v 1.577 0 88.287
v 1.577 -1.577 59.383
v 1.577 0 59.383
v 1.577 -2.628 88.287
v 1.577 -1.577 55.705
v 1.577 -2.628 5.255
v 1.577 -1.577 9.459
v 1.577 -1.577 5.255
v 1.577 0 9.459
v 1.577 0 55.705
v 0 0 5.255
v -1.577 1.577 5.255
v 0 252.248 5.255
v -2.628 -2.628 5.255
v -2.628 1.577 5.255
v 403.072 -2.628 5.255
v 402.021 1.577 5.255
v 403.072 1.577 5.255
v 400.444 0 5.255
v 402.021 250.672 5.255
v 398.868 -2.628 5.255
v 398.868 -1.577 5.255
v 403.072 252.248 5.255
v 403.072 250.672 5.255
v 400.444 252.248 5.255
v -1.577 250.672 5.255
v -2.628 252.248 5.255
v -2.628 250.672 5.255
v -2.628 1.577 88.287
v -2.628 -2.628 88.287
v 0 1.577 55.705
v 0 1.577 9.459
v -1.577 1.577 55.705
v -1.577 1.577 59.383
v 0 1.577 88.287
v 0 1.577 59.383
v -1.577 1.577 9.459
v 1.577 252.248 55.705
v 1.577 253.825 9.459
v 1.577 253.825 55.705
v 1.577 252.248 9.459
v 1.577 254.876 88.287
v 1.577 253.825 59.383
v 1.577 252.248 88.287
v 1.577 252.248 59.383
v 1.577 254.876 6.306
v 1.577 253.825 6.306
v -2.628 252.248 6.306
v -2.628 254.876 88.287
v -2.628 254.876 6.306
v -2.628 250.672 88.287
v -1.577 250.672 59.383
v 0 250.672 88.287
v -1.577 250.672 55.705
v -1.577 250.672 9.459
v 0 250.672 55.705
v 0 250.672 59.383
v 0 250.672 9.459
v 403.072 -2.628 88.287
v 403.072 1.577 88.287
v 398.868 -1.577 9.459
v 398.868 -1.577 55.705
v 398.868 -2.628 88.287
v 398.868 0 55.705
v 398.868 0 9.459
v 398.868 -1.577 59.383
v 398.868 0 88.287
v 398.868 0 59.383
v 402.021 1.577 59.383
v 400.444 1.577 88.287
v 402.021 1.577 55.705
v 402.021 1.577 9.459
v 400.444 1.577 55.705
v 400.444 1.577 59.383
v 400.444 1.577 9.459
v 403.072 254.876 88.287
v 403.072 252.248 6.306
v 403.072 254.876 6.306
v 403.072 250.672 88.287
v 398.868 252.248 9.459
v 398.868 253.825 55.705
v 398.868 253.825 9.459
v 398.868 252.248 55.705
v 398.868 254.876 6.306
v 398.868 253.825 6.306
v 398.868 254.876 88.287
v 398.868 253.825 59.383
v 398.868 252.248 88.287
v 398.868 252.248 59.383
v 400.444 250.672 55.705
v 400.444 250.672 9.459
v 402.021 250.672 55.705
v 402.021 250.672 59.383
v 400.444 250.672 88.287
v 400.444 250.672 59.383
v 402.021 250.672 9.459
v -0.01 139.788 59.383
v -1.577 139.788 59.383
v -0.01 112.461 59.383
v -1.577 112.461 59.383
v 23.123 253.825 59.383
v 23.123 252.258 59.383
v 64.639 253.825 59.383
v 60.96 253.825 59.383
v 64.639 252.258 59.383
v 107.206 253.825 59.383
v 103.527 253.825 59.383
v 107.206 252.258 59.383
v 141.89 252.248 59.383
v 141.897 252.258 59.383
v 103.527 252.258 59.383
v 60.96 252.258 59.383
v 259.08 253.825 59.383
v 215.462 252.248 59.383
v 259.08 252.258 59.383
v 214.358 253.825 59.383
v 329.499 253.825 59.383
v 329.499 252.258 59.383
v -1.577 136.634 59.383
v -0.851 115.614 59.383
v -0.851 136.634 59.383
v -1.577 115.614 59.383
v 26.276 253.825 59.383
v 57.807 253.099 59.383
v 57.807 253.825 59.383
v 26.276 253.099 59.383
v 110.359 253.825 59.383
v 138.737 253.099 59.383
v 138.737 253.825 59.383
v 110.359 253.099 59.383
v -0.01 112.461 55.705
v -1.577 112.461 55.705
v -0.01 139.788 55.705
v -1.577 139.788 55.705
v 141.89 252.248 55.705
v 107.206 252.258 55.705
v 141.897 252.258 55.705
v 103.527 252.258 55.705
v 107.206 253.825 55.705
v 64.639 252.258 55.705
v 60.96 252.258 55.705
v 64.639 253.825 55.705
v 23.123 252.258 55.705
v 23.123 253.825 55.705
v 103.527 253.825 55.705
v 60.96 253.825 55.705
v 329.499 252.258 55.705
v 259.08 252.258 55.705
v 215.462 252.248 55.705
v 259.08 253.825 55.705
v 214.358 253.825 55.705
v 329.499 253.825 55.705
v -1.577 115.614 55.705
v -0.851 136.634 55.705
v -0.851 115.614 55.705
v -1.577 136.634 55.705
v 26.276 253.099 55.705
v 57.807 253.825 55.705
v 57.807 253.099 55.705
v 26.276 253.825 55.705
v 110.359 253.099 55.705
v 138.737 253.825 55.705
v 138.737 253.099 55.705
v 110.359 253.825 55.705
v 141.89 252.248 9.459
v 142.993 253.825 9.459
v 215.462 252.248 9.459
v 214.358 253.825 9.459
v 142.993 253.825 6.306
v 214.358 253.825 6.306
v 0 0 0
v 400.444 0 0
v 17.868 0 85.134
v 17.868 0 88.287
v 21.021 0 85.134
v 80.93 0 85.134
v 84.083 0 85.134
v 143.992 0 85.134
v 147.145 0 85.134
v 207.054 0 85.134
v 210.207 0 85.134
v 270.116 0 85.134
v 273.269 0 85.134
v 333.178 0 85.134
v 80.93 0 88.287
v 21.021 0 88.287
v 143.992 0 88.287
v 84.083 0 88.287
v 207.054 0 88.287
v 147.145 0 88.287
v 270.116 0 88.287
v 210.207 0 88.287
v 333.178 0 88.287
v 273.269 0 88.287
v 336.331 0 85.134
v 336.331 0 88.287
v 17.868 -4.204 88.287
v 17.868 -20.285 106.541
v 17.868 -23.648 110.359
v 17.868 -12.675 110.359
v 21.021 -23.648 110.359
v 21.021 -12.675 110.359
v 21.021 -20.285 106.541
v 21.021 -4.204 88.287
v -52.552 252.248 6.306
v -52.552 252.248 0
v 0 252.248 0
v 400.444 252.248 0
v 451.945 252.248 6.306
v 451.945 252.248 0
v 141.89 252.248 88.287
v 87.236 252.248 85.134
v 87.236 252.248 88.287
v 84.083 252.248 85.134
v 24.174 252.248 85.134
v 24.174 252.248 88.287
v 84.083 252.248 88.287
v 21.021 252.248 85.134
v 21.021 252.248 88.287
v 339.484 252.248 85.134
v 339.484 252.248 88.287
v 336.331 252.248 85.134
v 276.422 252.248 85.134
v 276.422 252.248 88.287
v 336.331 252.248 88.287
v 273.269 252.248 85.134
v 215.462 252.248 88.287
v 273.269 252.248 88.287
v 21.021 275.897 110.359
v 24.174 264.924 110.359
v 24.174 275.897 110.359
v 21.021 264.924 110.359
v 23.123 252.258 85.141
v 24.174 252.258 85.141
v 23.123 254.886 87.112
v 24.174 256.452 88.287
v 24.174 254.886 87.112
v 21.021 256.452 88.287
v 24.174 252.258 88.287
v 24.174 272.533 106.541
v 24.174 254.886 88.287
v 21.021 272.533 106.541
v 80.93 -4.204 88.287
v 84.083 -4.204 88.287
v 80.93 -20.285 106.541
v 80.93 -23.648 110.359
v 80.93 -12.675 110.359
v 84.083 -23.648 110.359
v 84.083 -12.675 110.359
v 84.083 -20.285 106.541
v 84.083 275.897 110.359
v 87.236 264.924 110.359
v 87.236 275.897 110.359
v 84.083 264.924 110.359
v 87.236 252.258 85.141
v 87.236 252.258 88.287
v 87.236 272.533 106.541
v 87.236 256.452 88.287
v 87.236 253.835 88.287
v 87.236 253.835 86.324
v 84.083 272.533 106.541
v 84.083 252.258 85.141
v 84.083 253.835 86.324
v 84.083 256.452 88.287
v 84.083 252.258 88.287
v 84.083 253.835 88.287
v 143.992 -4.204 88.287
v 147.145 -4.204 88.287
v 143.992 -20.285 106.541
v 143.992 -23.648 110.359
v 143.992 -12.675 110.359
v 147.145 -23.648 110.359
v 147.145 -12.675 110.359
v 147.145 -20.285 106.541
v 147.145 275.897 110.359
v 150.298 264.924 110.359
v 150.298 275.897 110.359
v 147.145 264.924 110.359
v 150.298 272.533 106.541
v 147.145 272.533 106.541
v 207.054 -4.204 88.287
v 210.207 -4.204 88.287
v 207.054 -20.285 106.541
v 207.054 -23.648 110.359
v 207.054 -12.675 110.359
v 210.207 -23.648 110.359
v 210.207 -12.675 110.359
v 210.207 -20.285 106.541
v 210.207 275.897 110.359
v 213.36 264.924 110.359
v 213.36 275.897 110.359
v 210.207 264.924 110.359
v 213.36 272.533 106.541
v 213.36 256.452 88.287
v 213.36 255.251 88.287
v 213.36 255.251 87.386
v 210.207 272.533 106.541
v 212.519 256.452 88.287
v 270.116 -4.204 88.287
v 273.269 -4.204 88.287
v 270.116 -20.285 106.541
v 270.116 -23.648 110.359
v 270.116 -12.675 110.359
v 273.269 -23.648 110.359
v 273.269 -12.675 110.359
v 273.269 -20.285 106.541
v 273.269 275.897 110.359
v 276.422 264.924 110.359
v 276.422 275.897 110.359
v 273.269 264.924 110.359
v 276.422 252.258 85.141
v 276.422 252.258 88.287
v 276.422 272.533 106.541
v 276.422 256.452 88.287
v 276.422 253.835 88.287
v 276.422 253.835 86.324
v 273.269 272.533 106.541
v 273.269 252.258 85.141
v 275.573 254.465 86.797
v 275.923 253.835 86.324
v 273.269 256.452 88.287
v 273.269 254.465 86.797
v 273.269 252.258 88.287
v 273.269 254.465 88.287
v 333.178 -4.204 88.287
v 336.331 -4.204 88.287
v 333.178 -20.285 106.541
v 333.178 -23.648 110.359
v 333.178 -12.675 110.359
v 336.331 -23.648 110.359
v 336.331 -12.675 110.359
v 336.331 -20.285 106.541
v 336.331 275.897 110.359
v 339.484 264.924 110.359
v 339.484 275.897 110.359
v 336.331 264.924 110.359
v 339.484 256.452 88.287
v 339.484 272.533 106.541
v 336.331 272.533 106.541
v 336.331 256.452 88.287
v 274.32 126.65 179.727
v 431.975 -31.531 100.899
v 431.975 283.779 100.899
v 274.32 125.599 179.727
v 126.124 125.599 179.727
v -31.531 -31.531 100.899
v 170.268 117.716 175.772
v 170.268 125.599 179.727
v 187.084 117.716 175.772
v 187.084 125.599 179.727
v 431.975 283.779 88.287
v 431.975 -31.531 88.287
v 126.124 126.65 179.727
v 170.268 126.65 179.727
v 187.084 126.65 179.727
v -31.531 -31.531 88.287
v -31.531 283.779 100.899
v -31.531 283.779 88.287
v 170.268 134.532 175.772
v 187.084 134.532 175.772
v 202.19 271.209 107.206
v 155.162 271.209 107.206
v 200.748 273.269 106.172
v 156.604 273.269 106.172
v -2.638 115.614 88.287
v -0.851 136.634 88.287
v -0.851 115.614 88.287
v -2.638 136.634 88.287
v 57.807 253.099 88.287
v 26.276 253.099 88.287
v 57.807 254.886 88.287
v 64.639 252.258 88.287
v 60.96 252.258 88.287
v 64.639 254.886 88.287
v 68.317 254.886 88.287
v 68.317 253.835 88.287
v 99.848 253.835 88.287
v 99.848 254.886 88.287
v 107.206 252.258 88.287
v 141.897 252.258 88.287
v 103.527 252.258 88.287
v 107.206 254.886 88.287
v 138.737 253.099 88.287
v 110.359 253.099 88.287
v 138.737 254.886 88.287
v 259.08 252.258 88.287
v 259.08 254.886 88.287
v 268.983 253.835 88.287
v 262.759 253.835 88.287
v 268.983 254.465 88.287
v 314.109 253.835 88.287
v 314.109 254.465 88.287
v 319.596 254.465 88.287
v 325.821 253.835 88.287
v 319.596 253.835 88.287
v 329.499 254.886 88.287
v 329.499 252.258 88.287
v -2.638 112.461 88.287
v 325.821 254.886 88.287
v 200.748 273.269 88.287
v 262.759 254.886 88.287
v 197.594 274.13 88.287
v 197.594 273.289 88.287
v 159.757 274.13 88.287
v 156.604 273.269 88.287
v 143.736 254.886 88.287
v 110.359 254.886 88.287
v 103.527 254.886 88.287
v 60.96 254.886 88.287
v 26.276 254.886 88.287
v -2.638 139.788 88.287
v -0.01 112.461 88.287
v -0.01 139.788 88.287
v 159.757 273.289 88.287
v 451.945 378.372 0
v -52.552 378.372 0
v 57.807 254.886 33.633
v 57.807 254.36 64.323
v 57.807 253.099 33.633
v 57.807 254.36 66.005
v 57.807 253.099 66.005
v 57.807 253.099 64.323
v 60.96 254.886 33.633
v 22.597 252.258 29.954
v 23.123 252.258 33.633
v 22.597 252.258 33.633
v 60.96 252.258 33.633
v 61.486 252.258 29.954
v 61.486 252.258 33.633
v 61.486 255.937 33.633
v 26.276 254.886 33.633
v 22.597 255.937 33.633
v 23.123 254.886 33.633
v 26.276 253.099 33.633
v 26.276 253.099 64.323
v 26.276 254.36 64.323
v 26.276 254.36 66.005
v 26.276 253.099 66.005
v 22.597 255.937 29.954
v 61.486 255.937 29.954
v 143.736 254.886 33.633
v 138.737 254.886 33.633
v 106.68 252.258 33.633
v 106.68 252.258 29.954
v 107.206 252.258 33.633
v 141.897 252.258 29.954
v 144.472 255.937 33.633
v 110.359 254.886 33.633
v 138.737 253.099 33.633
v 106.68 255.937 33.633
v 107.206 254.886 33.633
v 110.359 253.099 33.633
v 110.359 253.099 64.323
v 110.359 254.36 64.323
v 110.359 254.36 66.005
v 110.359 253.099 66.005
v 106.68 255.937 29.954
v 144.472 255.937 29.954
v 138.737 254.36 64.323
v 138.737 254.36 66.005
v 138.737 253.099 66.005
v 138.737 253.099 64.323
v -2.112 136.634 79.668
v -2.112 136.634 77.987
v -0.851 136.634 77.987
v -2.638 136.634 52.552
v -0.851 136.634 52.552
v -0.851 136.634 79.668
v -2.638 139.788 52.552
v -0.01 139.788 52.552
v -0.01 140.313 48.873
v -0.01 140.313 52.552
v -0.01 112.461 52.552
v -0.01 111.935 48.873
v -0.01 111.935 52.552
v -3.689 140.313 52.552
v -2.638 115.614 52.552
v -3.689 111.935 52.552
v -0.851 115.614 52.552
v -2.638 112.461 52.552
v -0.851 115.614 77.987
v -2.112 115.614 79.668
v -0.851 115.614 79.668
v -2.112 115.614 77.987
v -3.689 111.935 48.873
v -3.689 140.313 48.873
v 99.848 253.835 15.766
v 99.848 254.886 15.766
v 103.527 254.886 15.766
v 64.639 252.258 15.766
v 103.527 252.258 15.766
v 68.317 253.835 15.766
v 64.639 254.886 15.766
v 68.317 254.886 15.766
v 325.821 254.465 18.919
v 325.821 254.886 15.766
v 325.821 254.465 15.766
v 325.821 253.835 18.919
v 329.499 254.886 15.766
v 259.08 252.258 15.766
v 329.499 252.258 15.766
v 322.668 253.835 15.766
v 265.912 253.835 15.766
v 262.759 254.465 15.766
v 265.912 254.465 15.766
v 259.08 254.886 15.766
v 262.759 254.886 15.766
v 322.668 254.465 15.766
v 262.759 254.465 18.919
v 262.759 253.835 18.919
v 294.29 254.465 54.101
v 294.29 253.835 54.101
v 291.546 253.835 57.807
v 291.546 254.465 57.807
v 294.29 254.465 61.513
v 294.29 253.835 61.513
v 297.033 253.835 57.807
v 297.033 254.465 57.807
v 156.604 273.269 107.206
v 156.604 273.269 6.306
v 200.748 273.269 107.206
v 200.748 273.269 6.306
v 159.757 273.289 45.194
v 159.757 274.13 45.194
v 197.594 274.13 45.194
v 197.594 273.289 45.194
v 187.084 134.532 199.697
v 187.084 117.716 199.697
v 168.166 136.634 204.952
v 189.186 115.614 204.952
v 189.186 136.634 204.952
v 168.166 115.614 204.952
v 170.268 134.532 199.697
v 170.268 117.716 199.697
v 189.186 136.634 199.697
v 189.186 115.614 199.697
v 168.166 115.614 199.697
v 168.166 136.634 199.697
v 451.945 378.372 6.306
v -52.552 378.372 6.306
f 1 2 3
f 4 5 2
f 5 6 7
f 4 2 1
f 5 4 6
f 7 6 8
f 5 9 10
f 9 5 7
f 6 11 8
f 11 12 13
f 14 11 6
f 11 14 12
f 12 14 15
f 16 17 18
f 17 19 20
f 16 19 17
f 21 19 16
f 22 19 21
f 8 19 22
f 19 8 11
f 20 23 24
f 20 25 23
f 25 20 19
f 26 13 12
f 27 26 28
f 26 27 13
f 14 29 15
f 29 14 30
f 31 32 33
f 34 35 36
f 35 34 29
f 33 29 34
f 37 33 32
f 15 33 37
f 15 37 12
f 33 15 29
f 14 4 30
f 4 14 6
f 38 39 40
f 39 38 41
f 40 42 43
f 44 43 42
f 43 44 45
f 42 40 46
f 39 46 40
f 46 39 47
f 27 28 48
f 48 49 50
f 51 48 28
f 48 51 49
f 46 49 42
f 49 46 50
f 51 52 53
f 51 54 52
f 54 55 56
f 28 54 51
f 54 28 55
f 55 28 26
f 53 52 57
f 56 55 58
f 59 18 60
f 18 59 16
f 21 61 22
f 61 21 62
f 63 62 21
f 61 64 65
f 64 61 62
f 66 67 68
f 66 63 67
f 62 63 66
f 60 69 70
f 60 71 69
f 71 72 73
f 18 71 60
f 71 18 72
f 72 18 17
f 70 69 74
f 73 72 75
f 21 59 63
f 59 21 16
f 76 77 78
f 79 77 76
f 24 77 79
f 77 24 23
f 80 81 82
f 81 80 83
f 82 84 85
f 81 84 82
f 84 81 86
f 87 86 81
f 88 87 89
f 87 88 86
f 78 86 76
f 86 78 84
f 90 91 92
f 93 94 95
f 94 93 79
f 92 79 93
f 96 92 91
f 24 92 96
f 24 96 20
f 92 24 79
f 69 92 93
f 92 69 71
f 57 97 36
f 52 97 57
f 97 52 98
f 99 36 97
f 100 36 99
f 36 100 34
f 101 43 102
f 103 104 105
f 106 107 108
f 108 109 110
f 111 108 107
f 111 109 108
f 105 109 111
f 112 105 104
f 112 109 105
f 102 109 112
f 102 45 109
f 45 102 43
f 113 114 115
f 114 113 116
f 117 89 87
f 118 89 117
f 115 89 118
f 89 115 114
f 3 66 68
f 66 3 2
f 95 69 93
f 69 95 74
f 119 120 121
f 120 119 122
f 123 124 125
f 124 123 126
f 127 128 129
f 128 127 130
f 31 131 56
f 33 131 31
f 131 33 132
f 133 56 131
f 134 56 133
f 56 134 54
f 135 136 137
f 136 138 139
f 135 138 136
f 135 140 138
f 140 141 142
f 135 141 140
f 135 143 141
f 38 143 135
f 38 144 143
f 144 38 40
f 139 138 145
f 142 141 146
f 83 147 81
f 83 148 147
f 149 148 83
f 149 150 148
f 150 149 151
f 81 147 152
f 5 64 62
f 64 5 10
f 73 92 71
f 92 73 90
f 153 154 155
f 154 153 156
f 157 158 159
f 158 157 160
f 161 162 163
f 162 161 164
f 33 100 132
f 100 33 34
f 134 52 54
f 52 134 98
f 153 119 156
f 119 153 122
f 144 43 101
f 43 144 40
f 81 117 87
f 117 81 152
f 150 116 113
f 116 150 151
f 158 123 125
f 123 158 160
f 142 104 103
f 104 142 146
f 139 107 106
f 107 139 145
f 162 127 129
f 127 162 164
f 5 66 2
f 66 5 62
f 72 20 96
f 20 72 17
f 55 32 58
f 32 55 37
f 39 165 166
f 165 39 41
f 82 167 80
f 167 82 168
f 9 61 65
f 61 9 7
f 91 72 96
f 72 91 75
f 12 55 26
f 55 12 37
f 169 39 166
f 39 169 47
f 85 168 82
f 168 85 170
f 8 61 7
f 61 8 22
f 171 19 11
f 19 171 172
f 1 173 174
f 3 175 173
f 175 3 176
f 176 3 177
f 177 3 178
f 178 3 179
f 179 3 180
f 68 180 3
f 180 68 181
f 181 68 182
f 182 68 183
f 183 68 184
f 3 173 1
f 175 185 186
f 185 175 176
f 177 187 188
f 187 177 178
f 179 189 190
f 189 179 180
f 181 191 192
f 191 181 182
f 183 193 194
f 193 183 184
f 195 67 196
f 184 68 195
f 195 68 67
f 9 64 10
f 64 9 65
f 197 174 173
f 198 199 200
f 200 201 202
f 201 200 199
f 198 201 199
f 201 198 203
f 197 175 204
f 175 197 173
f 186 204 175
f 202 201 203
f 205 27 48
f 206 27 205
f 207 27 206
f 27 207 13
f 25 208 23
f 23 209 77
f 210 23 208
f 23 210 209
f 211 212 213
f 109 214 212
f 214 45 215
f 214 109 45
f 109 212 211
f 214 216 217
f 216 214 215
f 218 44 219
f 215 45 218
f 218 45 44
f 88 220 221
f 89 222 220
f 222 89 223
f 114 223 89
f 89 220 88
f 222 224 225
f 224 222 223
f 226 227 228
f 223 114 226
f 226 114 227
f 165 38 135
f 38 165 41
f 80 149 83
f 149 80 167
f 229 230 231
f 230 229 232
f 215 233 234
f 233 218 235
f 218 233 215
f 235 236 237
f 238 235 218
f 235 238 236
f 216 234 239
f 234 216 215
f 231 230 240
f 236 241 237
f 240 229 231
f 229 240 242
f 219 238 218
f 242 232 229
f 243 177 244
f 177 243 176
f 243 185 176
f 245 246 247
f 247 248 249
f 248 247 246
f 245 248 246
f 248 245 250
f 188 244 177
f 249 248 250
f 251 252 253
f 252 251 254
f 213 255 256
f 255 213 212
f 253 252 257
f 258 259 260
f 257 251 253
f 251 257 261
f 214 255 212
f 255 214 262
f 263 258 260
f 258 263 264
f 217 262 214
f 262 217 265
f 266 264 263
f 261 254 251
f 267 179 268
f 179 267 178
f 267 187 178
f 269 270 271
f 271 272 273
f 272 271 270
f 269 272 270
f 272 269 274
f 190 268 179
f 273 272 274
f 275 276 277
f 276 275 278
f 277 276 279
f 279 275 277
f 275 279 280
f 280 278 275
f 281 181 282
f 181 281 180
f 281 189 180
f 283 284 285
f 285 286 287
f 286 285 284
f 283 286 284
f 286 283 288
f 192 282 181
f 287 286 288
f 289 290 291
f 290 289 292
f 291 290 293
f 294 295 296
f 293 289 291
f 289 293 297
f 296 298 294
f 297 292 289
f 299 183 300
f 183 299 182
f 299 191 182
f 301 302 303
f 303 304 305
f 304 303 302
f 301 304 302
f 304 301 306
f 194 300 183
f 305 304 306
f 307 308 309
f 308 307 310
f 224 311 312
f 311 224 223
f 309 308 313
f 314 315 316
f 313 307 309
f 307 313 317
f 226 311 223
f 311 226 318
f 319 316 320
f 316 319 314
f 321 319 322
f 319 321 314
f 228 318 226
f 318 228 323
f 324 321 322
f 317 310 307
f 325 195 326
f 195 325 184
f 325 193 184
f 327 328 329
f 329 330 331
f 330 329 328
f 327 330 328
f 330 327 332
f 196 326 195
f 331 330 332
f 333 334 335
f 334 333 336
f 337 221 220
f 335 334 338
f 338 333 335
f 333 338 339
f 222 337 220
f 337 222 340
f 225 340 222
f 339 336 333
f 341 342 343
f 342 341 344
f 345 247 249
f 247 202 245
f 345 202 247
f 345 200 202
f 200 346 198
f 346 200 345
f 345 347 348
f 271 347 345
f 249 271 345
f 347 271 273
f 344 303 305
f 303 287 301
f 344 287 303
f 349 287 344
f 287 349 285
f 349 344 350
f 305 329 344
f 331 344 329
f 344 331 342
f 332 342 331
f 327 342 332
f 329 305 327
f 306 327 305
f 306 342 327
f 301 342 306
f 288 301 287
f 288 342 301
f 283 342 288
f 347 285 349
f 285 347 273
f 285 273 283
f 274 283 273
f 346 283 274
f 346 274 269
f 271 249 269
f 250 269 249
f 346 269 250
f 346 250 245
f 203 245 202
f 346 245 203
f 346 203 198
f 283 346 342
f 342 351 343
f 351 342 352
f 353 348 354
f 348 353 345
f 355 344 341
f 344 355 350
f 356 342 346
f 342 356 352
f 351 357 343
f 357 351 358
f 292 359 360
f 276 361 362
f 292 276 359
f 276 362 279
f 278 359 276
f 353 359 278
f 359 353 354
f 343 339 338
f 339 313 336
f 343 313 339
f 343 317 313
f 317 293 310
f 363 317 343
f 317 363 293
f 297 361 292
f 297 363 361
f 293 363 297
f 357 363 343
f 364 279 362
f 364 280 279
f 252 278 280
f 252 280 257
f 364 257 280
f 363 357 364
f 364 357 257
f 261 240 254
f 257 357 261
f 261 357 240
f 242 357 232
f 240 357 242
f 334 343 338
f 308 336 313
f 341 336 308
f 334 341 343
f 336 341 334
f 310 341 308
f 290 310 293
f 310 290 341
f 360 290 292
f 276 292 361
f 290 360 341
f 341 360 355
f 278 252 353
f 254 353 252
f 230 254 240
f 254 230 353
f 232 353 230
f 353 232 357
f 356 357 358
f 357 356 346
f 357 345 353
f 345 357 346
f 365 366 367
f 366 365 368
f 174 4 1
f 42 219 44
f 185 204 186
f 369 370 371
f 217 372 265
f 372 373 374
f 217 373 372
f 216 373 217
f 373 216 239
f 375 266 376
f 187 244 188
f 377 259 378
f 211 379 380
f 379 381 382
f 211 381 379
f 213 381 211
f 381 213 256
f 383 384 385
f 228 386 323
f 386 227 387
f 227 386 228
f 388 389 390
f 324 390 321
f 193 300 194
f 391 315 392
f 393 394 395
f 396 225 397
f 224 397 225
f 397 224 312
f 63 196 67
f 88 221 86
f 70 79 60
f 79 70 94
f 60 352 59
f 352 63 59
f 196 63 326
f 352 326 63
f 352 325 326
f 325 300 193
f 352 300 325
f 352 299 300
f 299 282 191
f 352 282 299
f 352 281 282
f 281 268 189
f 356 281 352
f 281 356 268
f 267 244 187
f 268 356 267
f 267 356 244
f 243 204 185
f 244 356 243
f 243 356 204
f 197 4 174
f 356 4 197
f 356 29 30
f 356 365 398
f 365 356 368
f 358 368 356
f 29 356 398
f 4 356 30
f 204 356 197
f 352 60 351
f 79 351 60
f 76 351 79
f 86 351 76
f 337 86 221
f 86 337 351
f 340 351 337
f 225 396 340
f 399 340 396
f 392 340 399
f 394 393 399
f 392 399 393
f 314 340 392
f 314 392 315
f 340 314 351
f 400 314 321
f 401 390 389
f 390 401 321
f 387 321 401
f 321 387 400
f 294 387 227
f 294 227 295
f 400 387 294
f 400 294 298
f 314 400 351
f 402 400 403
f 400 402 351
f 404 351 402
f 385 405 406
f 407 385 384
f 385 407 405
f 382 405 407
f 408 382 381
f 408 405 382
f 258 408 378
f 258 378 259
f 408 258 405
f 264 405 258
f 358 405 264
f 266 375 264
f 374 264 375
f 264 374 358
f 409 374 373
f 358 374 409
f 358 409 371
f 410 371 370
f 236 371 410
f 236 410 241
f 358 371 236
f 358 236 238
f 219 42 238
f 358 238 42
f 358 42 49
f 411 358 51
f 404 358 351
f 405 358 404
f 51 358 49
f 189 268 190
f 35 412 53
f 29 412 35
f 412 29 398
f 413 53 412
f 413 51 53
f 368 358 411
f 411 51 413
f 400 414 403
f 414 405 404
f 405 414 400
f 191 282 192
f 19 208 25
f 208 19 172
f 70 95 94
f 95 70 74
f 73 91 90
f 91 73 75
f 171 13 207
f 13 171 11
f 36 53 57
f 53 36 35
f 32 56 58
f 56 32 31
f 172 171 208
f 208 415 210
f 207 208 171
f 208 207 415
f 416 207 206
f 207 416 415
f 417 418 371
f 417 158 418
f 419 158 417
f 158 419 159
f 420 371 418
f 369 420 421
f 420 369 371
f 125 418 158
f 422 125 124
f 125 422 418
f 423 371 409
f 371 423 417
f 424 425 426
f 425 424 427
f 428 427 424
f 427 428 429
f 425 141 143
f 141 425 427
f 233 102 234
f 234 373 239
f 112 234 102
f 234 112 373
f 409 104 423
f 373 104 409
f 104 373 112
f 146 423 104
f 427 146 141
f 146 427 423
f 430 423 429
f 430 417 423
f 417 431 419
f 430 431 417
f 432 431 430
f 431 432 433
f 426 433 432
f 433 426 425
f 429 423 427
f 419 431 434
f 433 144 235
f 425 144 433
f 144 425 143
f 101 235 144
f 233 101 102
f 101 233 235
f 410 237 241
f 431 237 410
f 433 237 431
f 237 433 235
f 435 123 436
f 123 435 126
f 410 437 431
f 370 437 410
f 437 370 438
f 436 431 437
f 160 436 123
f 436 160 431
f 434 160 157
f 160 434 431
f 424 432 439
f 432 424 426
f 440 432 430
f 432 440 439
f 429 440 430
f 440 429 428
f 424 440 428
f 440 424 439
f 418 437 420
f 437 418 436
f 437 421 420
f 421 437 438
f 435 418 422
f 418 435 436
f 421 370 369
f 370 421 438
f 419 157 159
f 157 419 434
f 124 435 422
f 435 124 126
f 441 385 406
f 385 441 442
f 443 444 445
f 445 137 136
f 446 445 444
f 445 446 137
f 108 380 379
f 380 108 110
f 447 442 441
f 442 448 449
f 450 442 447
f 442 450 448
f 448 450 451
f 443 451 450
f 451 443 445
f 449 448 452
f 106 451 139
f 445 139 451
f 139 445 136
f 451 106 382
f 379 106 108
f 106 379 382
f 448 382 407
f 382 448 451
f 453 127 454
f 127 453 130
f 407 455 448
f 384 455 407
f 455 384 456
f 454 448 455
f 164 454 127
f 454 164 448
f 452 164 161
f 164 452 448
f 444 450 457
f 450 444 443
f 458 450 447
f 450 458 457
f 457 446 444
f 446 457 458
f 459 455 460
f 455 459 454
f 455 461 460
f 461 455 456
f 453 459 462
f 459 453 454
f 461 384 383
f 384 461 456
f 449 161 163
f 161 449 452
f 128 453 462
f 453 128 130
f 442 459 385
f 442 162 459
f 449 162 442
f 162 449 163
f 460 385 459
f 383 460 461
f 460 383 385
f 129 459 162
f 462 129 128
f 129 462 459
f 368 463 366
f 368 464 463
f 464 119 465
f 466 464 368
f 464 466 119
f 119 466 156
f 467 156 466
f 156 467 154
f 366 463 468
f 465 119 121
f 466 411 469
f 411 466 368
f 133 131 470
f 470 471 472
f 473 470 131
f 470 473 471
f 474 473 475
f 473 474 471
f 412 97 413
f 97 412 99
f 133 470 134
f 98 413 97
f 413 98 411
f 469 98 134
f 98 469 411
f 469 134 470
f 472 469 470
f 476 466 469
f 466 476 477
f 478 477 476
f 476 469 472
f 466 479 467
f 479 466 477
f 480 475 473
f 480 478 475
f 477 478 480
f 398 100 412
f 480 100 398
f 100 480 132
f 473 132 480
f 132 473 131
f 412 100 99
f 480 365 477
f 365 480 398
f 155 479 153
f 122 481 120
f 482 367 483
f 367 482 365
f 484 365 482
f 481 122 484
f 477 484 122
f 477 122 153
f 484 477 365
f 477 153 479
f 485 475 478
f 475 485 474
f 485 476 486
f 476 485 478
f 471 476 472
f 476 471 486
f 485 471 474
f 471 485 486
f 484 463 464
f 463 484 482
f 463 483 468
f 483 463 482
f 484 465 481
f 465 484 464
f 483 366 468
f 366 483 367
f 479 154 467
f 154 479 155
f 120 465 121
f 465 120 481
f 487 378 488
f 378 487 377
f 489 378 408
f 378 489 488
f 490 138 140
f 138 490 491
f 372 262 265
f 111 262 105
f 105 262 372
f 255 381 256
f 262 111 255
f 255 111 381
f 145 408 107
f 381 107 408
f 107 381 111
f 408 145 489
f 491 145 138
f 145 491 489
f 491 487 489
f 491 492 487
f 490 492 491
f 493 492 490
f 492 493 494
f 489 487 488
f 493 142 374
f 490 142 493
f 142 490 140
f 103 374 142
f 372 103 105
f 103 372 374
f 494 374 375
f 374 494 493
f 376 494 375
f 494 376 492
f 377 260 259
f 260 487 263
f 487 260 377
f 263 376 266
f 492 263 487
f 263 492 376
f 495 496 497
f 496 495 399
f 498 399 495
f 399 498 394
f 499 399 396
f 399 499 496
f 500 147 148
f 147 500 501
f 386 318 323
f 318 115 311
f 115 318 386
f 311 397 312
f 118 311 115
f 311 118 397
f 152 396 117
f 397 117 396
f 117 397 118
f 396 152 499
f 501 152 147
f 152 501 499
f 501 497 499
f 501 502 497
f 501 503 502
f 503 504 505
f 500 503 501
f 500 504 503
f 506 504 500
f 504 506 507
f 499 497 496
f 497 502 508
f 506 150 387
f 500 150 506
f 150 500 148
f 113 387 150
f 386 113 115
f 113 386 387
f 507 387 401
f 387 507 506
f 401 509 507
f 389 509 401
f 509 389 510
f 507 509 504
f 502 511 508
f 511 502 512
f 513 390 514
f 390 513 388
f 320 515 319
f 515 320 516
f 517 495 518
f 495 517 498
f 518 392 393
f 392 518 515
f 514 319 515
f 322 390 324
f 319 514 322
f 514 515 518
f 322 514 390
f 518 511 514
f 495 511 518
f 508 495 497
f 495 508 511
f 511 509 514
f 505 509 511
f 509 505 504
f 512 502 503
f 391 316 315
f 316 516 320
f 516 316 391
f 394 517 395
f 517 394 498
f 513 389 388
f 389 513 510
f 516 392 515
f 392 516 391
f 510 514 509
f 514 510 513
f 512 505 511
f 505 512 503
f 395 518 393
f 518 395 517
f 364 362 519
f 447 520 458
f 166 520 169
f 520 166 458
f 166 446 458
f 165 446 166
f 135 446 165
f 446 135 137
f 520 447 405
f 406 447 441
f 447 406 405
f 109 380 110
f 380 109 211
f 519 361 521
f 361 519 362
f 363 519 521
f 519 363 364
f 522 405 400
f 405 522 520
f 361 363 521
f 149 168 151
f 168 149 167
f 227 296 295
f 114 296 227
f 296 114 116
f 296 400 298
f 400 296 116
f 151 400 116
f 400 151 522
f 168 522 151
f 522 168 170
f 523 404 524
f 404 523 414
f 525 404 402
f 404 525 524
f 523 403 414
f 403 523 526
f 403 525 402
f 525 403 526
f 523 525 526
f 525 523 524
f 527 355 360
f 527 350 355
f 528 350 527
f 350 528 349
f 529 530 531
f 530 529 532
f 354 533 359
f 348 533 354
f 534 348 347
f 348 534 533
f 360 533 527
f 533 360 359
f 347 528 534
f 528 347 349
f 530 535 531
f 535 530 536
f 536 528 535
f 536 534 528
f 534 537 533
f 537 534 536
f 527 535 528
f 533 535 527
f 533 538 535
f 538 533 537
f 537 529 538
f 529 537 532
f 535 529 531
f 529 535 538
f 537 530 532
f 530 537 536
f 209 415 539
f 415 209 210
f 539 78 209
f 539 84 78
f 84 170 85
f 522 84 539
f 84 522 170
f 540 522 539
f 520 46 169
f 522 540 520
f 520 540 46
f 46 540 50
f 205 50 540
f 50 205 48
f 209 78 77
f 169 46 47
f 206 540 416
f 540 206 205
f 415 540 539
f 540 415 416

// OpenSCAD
// =====================================================================
//  MILWAUKEE ROAD - PASSENGER STATION, OAKWOOD, WIS. (C.M.&ST.P. ENGINEERING DEPT., BUILT 1913)
//  Album of Depot Plans (1919), sheet 17. Private reference (in copyright):
//  Research Library / RSW / Stations / Standard depots / Album of Depot Plans 1919.
//  Rib Side Works, 24 Nov 2026. FIRST SHAPE MODEL for review - not cut into print sections.
//  KNOWN (from the sheet): 38 x 24 ft (38 ft 1 in); waiting room, office 9 ft 6 x 15 with bay, baggage and freight room 15 ft x 14 ft 8; hipped asphalt-shingle roof, drop siding with vertical boards below.
//  ESTIMATE: wall and ridge heights (sheets are small copies), window spacing, colours.
//  Shared depot builder ../../../_common/rsw_depot.scad (x along the track, y = 0 town side,
//  track side +y, feet).  SCALE: 29 = G, 48 = O, 87 = HO.
// =====================================================================
SCALE = 29;
include <../../../_common/rsw_depot.scad>

depot(blocks = [[0, 38.1, 0, 24, 10.5, 0.5, 0, 3, 0]],
      pavs   = [],
      wins   = [[4, 1, 3, 6, 3.2], [12, 1, 3, 6, 3.2], [15, 1, 3, 6, 3.2], [12, 2, 2, 5, 5]],
      doors  = [[8, 1, 3, 7.5, 0], [28, 1, 6, 8, 2]],
      bays   = [[17, 1, 7, 2]],
      chims  = [[17, 12, 19.5]],
      plat   = [-5, 48, 12, 0.6]);
